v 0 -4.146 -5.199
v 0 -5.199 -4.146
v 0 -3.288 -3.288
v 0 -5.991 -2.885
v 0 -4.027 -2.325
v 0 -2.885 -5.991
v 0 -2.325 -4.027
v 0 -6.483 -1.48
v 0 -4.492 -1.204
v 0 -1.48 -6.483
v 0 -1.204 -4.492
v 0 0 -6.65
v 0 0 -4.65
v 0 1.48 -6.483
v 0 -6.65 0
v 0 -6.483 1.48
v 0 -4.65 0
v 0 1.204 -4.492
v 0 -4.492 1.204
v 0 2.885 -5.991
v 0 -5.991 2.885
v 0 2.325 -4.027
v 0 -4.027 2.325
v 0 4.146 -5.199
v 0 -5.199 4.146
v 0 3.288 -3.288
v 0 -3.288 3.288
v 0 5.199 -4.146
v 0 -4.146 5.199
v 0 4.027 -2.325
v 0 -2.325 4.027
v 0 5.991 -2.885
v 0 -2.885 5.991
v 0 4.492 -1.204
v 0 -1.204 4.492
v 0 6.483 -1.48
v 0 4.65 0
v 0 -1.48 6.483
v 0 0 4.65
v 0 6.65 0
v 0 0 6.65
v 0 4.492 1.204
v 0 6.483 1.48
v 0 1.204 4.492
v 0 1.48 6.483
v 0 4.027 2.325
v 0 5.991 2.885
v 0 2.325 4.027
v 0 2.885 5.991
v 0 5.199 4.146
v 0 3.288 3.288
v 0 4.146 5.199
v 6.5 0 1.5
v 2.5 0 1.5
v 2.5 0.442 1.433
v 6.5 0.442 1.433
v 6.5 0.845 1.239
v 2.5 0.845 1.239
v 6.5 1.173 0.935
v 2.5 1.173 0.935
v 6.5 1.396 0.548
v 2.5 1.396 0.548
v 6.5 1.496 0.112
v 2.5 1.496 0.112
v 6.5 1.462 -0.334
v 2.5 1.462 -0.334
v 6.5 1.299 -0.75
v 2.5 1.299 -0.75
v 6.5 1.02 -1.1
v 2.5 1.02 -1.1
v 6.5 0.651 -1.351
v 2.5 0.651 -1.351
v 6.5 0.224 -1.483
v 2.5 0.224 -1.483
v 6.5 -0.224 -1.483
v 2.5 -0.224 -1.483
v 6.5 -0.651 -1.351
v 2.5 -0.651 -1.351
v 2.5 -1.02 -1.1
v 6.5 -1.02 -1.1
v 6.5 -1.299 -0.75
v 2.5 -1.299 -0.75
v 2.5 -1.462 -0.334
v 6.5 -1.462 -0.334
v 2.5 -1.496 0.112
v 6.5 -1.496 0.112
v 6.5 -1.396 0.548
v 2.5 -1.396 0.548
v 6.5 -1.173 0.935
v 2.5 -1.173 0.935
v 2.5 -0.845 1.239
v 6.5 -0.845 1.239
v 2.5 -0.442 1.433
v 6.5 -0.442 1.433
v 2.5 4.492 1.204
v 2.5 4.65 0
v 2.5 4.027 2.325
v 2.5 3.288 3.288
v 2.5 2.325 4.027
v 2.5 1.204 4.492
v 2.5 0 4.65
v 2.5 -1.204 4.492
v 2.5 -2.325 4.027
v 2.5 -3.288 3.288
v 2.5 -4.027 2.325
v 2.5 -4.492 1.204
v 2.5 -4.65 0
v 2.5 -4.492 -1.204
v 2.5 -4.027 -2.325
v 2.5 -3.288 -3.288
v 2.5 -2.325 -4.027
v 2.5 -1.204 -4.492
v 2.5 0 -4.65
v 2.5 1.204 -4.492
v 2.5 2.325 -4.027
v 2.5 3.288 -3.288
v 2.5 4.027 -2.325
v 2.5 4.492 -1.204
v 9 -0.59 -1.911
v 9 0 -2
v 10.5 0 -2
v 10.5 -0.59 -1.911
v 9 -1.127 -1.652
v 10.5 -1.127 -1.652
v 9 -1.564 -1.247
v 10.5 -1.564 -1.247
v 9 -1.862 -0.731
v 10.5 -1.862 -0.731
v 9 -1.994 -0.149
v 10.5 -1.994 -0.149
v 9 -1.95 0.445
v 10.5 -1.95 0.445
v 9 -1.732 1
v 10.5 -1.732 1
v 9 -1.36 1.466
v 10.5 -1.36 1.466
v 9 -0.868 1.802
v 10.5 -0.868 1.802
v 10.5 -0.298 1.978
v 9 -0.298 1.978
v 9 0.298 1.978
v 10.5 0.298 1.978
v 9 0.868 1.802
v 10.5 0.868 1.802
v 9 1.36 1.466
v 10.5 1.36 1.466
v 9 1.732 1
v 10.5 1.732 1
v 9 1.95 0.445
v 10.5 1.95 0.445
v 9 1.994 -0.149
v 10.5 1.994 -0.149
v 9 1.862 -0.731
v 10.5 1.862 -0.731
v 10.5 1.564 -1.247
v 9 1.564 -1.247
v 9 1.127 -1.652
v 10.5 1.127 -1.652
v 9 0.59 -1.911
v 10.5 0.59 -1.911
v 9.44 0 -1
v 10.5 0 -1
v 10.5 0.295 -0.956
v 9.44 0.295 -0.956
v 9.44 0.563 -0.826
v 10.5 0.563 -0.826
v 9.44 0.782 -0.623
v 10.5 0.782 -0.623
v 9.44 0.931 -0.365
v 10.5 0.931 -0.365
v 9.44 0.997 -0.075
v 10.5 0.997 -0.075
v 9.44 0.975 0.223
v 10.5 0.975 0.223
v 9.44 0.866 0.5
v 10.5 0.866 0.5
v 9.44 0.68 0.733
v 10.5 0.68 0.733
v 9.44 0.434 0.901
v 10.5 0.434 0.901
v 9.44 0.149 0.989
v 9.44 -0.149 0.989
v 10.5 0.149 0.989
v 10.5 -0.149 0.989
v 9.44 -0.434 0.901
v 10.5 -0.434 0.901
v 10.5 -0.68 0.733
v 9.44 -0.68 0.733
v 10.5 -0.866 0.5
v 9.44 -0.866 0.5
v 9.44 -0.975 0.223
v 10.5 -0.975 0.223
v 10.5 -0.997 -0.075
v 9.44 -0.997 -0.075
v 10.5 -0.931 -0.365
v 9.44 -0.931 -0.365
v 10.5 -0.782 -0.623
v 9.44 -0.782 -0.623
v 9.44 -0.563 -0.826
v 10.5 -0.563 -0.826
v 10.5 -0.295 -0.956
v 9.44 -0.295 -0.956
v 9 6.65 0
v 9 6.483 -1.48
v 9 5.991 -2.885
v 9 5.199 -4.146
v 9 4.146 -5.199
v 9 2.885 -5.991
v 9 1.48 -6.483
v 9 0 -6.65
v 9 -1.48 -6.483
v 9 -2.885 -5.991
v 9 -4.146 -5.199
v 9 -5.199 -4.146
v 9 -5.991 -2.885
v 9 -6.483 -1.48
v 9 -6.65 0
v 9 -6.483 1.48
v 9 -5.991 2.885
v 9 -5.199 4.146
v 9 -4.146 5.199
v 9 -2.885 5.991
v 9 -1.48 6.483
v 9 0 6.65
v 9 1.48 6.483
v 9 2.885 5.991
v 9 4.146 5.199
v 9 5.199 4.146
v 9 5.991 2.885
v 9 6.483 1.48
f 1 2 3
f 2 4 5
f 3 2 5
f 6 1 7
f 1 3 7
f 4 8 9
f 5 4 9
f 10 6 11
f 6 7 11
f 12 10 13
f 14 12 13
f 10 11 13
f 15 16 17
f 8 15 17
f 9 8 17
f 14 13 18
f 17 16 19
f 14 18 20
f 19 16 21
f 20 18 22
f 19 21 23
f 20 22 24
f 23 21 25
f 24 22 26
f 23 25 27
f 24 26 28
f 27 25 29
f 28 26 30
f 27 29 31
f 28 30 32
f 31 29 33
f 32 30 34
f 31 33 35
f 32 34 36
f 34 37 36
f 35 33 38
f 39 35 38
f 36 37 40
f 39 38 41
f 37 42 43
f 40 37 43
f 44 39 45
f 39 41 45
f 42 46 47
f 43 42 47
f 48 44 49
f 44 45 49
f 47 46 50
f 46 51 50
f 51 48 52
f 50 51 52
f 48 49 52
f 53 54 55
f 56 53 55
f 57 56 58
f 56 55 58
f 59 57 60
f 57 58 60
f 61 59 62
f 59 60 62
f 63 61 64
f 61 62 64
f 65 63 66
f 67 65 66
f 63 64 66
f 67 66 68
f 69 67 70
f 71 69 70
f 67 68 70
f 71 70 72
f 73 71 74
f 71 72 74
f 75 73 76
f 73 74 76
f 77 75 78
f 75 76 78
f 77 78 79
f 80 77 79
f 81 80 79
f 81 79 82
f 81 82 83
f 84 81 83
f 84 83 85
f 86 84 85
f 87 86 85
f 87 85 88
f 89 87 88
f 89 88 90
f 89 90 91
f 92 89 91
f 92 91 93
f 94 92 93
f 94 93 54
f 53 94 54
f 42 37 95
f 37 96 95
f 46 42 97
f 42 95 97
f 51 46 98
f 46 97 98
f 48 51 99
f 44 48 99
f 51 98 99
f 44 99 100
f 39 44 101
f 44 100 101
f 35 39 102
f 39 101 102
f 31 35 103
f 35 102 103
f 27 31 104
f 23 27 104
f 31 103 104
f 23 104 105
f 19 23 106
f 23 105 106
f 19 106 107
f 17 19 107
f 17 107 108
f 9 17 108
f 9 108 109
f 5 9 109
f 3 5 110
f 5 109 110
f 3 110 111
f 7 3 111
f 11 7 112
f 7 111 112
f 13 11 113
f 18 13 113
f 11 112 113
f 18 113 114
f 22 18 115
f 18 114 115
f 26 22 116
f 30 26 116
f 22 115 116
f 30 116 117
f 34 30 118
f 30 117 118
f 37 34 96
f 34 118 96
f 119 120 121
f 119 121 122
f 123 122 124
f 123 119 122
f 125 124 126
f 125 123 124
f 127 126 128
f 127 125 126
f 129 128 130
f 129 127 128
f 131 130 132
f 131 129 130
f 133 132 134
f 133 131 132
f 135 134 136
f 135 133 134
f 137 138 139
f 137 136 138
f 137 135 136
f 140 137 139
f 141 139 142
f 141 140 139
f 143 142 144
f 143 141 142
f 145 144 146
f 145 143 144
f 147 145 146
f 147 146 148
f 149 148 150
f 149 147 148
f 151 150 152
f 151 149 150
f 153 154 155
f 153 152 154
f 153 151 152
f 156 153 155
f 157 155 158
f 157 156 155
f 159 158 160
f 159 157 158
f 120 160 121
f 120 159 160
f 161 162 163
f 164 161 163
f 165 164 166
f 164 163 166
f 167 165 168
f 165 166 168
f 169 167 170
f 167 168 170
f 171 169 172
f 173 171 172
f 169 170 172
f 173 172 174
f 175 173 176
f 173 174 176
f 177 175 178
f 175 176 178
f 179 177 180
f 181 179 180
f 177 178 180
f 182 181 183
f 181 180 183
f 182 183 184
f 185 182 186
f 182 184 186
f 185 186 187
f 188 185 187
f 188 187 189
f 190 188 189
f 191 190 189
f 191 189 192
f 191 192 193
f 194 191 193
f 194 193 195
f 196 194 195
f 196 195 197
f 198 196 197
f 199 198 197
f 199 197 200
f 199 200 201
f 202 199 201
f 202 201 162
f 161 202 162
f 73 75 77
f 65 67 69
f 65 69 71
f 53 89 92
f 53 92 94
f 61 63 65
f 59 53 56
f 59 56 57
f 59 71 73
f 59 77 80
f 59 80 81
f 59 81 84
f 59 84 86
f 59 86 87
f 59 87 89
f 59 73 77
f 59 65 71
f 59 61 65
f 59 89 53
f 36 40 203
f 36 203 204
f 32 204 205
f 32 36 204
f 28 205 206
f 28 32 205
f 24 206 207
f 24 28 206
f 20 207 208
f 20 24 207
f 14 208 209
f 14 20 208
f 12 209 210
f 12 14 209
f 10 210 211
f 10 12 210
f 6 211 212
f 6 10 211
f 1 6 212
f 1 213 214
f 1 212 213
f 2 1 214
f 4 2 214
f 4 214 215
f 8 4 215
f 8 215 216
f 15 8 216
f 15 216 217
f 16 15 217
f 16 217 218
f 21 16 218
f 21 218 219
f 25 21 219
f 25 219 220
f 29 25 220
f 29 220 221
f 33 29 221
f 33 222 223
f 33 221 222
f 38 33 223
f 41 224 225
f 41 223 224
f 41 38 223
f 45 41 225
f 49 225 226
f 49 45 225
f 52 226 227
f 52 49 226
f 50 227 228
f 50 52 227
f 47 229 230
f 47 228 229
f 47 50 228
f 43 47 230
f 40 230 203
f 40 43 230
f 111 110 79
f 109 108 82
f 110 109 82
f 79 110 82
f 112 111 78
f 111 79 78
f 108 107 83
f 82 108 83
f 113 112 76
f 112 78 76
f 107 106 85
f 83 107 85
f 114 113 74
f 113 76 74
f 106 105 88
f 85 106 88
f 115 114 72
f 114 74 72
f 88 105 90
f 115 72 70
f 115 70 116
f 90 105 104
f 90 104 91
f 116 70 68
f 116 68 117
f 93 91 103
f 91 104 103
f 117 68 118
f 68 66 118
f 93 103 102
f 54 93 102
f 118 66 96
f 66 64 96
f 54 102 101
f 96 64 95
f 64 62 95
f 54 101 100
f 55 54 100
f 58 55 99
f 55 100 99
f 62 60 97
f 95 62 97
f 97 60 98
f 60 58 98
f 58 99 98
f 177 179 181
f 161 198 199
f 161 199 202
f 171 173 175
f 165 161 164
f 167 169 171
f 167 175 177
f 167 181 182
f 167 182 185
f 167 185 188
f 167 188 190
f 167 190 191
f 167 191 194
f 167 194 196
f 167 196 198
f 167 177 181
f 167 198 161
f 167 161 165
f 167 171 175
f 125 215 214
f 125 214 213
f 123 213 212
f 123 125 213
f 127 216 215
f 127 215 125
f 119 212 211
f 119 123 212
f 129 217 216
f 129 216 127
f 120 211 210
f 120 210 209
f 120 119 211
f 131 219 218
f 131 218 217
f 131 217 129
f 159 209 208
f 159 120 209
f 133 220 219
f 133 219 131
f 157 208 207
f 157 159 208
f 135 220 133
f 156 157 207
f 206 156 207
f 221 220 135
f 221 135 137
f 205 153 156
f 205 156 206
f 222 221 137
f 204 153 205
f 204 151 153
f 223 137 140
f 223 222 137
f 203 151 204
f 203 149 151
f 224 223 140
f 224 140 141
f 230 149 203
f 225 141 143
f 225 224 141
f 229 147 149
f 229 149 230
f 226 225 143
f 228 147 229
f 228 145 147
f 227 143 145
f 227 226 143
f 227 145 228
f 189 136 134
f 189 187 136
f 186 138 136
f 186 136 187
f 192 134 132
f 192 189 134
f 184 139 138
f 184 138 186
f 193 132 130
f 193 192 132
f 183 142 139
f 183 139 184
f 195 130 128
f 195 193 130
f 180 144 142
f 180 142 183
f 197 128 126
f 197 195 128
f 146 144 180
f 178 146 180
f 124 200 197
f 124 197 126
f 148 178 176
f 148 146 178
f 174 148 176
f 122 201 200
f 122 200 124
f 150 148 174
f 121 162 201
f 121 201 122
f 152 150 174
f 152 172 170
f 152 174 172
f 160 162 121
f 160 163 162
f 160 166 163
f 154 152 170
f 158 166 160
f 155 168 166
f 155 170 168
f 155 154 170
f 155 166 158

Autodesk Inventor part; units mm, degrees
ref_plane "YZ Plane" through (0, 0, 0) normal (1, 0, 0) x (0, 1, 0)
ref_plane "XZ Plane" through (0, 0, 0) normal (0, 1, 0) x (-1, 0, 0)
ref_plane "XY Plane" through (0, 0, 0) normal (0, 0, 1) x (1, 0, 0)
sketch "Esboço1" plane through (0, 0, 0) normal (0, 0, 1) x (1, 0, 0)
  line L0 (0, 0) -> (9, 0)
  line L1 (9, 0) -> (9, 6.65)
  line L2 (9, 6.65) -> (0, 6.65)
  line L3 (0, 6.65) -> (0, 4.65)
  line L4 (0, 4.65) -> (2.5, 4.65)
  line L5 (2.5, 4.65) -> (2.5, 0)
  dimension "d0" = 9
  dimension "d1" = 6.65
  dimension "d2" = 2
  dimension "d3" = 2.5
revolve "Revolução1" add sketch "Esboço1" angle 360 about axis through (0, 0, 0) along (1, 0, 0)
sketch "Esboço2" plane through (9, 0, 0) normal (1, 0, 0) x (0, 0, -1)
  circle A0 centre (0, 0) radius 2
  dimension "d5" = 4
extrude "Extrusão1" add sketch "Esboço2" along normal blind 1.5
sketch "Esboço3" plane through (2.5, 0, 0) normal (-1, 0, 0) x (0, 0, 1)
  circle A0 centre (0, 0) radius 1.5
  dimension "d8" = 3
extrude "Extrusão2" cut sketch "Esboço3" against normal blind 4
sketch "Esboço4" plane through (0, 0, 0) normal (-1, 0, 0) x (0, 0, 1)
  point P0 (0, 0)
sketch "Esboço5" plane through (9, 0, 0) normal (1, 0, 0) x (0, 0, -1)
  point P0 (0, 0)
sketch "Esboço6" plane through (10.5, 0, 0) normal (1, 0, 0) x (0, 0, -1)
  circle A0 centre (0, 0) radius 2 projected
  circle A1 centre (0, 0) radius 1
  dimension "d11" = 2
extrude "Extrusão3" cut sketch "Esboço6" against normal blind 1.06 contours A1
